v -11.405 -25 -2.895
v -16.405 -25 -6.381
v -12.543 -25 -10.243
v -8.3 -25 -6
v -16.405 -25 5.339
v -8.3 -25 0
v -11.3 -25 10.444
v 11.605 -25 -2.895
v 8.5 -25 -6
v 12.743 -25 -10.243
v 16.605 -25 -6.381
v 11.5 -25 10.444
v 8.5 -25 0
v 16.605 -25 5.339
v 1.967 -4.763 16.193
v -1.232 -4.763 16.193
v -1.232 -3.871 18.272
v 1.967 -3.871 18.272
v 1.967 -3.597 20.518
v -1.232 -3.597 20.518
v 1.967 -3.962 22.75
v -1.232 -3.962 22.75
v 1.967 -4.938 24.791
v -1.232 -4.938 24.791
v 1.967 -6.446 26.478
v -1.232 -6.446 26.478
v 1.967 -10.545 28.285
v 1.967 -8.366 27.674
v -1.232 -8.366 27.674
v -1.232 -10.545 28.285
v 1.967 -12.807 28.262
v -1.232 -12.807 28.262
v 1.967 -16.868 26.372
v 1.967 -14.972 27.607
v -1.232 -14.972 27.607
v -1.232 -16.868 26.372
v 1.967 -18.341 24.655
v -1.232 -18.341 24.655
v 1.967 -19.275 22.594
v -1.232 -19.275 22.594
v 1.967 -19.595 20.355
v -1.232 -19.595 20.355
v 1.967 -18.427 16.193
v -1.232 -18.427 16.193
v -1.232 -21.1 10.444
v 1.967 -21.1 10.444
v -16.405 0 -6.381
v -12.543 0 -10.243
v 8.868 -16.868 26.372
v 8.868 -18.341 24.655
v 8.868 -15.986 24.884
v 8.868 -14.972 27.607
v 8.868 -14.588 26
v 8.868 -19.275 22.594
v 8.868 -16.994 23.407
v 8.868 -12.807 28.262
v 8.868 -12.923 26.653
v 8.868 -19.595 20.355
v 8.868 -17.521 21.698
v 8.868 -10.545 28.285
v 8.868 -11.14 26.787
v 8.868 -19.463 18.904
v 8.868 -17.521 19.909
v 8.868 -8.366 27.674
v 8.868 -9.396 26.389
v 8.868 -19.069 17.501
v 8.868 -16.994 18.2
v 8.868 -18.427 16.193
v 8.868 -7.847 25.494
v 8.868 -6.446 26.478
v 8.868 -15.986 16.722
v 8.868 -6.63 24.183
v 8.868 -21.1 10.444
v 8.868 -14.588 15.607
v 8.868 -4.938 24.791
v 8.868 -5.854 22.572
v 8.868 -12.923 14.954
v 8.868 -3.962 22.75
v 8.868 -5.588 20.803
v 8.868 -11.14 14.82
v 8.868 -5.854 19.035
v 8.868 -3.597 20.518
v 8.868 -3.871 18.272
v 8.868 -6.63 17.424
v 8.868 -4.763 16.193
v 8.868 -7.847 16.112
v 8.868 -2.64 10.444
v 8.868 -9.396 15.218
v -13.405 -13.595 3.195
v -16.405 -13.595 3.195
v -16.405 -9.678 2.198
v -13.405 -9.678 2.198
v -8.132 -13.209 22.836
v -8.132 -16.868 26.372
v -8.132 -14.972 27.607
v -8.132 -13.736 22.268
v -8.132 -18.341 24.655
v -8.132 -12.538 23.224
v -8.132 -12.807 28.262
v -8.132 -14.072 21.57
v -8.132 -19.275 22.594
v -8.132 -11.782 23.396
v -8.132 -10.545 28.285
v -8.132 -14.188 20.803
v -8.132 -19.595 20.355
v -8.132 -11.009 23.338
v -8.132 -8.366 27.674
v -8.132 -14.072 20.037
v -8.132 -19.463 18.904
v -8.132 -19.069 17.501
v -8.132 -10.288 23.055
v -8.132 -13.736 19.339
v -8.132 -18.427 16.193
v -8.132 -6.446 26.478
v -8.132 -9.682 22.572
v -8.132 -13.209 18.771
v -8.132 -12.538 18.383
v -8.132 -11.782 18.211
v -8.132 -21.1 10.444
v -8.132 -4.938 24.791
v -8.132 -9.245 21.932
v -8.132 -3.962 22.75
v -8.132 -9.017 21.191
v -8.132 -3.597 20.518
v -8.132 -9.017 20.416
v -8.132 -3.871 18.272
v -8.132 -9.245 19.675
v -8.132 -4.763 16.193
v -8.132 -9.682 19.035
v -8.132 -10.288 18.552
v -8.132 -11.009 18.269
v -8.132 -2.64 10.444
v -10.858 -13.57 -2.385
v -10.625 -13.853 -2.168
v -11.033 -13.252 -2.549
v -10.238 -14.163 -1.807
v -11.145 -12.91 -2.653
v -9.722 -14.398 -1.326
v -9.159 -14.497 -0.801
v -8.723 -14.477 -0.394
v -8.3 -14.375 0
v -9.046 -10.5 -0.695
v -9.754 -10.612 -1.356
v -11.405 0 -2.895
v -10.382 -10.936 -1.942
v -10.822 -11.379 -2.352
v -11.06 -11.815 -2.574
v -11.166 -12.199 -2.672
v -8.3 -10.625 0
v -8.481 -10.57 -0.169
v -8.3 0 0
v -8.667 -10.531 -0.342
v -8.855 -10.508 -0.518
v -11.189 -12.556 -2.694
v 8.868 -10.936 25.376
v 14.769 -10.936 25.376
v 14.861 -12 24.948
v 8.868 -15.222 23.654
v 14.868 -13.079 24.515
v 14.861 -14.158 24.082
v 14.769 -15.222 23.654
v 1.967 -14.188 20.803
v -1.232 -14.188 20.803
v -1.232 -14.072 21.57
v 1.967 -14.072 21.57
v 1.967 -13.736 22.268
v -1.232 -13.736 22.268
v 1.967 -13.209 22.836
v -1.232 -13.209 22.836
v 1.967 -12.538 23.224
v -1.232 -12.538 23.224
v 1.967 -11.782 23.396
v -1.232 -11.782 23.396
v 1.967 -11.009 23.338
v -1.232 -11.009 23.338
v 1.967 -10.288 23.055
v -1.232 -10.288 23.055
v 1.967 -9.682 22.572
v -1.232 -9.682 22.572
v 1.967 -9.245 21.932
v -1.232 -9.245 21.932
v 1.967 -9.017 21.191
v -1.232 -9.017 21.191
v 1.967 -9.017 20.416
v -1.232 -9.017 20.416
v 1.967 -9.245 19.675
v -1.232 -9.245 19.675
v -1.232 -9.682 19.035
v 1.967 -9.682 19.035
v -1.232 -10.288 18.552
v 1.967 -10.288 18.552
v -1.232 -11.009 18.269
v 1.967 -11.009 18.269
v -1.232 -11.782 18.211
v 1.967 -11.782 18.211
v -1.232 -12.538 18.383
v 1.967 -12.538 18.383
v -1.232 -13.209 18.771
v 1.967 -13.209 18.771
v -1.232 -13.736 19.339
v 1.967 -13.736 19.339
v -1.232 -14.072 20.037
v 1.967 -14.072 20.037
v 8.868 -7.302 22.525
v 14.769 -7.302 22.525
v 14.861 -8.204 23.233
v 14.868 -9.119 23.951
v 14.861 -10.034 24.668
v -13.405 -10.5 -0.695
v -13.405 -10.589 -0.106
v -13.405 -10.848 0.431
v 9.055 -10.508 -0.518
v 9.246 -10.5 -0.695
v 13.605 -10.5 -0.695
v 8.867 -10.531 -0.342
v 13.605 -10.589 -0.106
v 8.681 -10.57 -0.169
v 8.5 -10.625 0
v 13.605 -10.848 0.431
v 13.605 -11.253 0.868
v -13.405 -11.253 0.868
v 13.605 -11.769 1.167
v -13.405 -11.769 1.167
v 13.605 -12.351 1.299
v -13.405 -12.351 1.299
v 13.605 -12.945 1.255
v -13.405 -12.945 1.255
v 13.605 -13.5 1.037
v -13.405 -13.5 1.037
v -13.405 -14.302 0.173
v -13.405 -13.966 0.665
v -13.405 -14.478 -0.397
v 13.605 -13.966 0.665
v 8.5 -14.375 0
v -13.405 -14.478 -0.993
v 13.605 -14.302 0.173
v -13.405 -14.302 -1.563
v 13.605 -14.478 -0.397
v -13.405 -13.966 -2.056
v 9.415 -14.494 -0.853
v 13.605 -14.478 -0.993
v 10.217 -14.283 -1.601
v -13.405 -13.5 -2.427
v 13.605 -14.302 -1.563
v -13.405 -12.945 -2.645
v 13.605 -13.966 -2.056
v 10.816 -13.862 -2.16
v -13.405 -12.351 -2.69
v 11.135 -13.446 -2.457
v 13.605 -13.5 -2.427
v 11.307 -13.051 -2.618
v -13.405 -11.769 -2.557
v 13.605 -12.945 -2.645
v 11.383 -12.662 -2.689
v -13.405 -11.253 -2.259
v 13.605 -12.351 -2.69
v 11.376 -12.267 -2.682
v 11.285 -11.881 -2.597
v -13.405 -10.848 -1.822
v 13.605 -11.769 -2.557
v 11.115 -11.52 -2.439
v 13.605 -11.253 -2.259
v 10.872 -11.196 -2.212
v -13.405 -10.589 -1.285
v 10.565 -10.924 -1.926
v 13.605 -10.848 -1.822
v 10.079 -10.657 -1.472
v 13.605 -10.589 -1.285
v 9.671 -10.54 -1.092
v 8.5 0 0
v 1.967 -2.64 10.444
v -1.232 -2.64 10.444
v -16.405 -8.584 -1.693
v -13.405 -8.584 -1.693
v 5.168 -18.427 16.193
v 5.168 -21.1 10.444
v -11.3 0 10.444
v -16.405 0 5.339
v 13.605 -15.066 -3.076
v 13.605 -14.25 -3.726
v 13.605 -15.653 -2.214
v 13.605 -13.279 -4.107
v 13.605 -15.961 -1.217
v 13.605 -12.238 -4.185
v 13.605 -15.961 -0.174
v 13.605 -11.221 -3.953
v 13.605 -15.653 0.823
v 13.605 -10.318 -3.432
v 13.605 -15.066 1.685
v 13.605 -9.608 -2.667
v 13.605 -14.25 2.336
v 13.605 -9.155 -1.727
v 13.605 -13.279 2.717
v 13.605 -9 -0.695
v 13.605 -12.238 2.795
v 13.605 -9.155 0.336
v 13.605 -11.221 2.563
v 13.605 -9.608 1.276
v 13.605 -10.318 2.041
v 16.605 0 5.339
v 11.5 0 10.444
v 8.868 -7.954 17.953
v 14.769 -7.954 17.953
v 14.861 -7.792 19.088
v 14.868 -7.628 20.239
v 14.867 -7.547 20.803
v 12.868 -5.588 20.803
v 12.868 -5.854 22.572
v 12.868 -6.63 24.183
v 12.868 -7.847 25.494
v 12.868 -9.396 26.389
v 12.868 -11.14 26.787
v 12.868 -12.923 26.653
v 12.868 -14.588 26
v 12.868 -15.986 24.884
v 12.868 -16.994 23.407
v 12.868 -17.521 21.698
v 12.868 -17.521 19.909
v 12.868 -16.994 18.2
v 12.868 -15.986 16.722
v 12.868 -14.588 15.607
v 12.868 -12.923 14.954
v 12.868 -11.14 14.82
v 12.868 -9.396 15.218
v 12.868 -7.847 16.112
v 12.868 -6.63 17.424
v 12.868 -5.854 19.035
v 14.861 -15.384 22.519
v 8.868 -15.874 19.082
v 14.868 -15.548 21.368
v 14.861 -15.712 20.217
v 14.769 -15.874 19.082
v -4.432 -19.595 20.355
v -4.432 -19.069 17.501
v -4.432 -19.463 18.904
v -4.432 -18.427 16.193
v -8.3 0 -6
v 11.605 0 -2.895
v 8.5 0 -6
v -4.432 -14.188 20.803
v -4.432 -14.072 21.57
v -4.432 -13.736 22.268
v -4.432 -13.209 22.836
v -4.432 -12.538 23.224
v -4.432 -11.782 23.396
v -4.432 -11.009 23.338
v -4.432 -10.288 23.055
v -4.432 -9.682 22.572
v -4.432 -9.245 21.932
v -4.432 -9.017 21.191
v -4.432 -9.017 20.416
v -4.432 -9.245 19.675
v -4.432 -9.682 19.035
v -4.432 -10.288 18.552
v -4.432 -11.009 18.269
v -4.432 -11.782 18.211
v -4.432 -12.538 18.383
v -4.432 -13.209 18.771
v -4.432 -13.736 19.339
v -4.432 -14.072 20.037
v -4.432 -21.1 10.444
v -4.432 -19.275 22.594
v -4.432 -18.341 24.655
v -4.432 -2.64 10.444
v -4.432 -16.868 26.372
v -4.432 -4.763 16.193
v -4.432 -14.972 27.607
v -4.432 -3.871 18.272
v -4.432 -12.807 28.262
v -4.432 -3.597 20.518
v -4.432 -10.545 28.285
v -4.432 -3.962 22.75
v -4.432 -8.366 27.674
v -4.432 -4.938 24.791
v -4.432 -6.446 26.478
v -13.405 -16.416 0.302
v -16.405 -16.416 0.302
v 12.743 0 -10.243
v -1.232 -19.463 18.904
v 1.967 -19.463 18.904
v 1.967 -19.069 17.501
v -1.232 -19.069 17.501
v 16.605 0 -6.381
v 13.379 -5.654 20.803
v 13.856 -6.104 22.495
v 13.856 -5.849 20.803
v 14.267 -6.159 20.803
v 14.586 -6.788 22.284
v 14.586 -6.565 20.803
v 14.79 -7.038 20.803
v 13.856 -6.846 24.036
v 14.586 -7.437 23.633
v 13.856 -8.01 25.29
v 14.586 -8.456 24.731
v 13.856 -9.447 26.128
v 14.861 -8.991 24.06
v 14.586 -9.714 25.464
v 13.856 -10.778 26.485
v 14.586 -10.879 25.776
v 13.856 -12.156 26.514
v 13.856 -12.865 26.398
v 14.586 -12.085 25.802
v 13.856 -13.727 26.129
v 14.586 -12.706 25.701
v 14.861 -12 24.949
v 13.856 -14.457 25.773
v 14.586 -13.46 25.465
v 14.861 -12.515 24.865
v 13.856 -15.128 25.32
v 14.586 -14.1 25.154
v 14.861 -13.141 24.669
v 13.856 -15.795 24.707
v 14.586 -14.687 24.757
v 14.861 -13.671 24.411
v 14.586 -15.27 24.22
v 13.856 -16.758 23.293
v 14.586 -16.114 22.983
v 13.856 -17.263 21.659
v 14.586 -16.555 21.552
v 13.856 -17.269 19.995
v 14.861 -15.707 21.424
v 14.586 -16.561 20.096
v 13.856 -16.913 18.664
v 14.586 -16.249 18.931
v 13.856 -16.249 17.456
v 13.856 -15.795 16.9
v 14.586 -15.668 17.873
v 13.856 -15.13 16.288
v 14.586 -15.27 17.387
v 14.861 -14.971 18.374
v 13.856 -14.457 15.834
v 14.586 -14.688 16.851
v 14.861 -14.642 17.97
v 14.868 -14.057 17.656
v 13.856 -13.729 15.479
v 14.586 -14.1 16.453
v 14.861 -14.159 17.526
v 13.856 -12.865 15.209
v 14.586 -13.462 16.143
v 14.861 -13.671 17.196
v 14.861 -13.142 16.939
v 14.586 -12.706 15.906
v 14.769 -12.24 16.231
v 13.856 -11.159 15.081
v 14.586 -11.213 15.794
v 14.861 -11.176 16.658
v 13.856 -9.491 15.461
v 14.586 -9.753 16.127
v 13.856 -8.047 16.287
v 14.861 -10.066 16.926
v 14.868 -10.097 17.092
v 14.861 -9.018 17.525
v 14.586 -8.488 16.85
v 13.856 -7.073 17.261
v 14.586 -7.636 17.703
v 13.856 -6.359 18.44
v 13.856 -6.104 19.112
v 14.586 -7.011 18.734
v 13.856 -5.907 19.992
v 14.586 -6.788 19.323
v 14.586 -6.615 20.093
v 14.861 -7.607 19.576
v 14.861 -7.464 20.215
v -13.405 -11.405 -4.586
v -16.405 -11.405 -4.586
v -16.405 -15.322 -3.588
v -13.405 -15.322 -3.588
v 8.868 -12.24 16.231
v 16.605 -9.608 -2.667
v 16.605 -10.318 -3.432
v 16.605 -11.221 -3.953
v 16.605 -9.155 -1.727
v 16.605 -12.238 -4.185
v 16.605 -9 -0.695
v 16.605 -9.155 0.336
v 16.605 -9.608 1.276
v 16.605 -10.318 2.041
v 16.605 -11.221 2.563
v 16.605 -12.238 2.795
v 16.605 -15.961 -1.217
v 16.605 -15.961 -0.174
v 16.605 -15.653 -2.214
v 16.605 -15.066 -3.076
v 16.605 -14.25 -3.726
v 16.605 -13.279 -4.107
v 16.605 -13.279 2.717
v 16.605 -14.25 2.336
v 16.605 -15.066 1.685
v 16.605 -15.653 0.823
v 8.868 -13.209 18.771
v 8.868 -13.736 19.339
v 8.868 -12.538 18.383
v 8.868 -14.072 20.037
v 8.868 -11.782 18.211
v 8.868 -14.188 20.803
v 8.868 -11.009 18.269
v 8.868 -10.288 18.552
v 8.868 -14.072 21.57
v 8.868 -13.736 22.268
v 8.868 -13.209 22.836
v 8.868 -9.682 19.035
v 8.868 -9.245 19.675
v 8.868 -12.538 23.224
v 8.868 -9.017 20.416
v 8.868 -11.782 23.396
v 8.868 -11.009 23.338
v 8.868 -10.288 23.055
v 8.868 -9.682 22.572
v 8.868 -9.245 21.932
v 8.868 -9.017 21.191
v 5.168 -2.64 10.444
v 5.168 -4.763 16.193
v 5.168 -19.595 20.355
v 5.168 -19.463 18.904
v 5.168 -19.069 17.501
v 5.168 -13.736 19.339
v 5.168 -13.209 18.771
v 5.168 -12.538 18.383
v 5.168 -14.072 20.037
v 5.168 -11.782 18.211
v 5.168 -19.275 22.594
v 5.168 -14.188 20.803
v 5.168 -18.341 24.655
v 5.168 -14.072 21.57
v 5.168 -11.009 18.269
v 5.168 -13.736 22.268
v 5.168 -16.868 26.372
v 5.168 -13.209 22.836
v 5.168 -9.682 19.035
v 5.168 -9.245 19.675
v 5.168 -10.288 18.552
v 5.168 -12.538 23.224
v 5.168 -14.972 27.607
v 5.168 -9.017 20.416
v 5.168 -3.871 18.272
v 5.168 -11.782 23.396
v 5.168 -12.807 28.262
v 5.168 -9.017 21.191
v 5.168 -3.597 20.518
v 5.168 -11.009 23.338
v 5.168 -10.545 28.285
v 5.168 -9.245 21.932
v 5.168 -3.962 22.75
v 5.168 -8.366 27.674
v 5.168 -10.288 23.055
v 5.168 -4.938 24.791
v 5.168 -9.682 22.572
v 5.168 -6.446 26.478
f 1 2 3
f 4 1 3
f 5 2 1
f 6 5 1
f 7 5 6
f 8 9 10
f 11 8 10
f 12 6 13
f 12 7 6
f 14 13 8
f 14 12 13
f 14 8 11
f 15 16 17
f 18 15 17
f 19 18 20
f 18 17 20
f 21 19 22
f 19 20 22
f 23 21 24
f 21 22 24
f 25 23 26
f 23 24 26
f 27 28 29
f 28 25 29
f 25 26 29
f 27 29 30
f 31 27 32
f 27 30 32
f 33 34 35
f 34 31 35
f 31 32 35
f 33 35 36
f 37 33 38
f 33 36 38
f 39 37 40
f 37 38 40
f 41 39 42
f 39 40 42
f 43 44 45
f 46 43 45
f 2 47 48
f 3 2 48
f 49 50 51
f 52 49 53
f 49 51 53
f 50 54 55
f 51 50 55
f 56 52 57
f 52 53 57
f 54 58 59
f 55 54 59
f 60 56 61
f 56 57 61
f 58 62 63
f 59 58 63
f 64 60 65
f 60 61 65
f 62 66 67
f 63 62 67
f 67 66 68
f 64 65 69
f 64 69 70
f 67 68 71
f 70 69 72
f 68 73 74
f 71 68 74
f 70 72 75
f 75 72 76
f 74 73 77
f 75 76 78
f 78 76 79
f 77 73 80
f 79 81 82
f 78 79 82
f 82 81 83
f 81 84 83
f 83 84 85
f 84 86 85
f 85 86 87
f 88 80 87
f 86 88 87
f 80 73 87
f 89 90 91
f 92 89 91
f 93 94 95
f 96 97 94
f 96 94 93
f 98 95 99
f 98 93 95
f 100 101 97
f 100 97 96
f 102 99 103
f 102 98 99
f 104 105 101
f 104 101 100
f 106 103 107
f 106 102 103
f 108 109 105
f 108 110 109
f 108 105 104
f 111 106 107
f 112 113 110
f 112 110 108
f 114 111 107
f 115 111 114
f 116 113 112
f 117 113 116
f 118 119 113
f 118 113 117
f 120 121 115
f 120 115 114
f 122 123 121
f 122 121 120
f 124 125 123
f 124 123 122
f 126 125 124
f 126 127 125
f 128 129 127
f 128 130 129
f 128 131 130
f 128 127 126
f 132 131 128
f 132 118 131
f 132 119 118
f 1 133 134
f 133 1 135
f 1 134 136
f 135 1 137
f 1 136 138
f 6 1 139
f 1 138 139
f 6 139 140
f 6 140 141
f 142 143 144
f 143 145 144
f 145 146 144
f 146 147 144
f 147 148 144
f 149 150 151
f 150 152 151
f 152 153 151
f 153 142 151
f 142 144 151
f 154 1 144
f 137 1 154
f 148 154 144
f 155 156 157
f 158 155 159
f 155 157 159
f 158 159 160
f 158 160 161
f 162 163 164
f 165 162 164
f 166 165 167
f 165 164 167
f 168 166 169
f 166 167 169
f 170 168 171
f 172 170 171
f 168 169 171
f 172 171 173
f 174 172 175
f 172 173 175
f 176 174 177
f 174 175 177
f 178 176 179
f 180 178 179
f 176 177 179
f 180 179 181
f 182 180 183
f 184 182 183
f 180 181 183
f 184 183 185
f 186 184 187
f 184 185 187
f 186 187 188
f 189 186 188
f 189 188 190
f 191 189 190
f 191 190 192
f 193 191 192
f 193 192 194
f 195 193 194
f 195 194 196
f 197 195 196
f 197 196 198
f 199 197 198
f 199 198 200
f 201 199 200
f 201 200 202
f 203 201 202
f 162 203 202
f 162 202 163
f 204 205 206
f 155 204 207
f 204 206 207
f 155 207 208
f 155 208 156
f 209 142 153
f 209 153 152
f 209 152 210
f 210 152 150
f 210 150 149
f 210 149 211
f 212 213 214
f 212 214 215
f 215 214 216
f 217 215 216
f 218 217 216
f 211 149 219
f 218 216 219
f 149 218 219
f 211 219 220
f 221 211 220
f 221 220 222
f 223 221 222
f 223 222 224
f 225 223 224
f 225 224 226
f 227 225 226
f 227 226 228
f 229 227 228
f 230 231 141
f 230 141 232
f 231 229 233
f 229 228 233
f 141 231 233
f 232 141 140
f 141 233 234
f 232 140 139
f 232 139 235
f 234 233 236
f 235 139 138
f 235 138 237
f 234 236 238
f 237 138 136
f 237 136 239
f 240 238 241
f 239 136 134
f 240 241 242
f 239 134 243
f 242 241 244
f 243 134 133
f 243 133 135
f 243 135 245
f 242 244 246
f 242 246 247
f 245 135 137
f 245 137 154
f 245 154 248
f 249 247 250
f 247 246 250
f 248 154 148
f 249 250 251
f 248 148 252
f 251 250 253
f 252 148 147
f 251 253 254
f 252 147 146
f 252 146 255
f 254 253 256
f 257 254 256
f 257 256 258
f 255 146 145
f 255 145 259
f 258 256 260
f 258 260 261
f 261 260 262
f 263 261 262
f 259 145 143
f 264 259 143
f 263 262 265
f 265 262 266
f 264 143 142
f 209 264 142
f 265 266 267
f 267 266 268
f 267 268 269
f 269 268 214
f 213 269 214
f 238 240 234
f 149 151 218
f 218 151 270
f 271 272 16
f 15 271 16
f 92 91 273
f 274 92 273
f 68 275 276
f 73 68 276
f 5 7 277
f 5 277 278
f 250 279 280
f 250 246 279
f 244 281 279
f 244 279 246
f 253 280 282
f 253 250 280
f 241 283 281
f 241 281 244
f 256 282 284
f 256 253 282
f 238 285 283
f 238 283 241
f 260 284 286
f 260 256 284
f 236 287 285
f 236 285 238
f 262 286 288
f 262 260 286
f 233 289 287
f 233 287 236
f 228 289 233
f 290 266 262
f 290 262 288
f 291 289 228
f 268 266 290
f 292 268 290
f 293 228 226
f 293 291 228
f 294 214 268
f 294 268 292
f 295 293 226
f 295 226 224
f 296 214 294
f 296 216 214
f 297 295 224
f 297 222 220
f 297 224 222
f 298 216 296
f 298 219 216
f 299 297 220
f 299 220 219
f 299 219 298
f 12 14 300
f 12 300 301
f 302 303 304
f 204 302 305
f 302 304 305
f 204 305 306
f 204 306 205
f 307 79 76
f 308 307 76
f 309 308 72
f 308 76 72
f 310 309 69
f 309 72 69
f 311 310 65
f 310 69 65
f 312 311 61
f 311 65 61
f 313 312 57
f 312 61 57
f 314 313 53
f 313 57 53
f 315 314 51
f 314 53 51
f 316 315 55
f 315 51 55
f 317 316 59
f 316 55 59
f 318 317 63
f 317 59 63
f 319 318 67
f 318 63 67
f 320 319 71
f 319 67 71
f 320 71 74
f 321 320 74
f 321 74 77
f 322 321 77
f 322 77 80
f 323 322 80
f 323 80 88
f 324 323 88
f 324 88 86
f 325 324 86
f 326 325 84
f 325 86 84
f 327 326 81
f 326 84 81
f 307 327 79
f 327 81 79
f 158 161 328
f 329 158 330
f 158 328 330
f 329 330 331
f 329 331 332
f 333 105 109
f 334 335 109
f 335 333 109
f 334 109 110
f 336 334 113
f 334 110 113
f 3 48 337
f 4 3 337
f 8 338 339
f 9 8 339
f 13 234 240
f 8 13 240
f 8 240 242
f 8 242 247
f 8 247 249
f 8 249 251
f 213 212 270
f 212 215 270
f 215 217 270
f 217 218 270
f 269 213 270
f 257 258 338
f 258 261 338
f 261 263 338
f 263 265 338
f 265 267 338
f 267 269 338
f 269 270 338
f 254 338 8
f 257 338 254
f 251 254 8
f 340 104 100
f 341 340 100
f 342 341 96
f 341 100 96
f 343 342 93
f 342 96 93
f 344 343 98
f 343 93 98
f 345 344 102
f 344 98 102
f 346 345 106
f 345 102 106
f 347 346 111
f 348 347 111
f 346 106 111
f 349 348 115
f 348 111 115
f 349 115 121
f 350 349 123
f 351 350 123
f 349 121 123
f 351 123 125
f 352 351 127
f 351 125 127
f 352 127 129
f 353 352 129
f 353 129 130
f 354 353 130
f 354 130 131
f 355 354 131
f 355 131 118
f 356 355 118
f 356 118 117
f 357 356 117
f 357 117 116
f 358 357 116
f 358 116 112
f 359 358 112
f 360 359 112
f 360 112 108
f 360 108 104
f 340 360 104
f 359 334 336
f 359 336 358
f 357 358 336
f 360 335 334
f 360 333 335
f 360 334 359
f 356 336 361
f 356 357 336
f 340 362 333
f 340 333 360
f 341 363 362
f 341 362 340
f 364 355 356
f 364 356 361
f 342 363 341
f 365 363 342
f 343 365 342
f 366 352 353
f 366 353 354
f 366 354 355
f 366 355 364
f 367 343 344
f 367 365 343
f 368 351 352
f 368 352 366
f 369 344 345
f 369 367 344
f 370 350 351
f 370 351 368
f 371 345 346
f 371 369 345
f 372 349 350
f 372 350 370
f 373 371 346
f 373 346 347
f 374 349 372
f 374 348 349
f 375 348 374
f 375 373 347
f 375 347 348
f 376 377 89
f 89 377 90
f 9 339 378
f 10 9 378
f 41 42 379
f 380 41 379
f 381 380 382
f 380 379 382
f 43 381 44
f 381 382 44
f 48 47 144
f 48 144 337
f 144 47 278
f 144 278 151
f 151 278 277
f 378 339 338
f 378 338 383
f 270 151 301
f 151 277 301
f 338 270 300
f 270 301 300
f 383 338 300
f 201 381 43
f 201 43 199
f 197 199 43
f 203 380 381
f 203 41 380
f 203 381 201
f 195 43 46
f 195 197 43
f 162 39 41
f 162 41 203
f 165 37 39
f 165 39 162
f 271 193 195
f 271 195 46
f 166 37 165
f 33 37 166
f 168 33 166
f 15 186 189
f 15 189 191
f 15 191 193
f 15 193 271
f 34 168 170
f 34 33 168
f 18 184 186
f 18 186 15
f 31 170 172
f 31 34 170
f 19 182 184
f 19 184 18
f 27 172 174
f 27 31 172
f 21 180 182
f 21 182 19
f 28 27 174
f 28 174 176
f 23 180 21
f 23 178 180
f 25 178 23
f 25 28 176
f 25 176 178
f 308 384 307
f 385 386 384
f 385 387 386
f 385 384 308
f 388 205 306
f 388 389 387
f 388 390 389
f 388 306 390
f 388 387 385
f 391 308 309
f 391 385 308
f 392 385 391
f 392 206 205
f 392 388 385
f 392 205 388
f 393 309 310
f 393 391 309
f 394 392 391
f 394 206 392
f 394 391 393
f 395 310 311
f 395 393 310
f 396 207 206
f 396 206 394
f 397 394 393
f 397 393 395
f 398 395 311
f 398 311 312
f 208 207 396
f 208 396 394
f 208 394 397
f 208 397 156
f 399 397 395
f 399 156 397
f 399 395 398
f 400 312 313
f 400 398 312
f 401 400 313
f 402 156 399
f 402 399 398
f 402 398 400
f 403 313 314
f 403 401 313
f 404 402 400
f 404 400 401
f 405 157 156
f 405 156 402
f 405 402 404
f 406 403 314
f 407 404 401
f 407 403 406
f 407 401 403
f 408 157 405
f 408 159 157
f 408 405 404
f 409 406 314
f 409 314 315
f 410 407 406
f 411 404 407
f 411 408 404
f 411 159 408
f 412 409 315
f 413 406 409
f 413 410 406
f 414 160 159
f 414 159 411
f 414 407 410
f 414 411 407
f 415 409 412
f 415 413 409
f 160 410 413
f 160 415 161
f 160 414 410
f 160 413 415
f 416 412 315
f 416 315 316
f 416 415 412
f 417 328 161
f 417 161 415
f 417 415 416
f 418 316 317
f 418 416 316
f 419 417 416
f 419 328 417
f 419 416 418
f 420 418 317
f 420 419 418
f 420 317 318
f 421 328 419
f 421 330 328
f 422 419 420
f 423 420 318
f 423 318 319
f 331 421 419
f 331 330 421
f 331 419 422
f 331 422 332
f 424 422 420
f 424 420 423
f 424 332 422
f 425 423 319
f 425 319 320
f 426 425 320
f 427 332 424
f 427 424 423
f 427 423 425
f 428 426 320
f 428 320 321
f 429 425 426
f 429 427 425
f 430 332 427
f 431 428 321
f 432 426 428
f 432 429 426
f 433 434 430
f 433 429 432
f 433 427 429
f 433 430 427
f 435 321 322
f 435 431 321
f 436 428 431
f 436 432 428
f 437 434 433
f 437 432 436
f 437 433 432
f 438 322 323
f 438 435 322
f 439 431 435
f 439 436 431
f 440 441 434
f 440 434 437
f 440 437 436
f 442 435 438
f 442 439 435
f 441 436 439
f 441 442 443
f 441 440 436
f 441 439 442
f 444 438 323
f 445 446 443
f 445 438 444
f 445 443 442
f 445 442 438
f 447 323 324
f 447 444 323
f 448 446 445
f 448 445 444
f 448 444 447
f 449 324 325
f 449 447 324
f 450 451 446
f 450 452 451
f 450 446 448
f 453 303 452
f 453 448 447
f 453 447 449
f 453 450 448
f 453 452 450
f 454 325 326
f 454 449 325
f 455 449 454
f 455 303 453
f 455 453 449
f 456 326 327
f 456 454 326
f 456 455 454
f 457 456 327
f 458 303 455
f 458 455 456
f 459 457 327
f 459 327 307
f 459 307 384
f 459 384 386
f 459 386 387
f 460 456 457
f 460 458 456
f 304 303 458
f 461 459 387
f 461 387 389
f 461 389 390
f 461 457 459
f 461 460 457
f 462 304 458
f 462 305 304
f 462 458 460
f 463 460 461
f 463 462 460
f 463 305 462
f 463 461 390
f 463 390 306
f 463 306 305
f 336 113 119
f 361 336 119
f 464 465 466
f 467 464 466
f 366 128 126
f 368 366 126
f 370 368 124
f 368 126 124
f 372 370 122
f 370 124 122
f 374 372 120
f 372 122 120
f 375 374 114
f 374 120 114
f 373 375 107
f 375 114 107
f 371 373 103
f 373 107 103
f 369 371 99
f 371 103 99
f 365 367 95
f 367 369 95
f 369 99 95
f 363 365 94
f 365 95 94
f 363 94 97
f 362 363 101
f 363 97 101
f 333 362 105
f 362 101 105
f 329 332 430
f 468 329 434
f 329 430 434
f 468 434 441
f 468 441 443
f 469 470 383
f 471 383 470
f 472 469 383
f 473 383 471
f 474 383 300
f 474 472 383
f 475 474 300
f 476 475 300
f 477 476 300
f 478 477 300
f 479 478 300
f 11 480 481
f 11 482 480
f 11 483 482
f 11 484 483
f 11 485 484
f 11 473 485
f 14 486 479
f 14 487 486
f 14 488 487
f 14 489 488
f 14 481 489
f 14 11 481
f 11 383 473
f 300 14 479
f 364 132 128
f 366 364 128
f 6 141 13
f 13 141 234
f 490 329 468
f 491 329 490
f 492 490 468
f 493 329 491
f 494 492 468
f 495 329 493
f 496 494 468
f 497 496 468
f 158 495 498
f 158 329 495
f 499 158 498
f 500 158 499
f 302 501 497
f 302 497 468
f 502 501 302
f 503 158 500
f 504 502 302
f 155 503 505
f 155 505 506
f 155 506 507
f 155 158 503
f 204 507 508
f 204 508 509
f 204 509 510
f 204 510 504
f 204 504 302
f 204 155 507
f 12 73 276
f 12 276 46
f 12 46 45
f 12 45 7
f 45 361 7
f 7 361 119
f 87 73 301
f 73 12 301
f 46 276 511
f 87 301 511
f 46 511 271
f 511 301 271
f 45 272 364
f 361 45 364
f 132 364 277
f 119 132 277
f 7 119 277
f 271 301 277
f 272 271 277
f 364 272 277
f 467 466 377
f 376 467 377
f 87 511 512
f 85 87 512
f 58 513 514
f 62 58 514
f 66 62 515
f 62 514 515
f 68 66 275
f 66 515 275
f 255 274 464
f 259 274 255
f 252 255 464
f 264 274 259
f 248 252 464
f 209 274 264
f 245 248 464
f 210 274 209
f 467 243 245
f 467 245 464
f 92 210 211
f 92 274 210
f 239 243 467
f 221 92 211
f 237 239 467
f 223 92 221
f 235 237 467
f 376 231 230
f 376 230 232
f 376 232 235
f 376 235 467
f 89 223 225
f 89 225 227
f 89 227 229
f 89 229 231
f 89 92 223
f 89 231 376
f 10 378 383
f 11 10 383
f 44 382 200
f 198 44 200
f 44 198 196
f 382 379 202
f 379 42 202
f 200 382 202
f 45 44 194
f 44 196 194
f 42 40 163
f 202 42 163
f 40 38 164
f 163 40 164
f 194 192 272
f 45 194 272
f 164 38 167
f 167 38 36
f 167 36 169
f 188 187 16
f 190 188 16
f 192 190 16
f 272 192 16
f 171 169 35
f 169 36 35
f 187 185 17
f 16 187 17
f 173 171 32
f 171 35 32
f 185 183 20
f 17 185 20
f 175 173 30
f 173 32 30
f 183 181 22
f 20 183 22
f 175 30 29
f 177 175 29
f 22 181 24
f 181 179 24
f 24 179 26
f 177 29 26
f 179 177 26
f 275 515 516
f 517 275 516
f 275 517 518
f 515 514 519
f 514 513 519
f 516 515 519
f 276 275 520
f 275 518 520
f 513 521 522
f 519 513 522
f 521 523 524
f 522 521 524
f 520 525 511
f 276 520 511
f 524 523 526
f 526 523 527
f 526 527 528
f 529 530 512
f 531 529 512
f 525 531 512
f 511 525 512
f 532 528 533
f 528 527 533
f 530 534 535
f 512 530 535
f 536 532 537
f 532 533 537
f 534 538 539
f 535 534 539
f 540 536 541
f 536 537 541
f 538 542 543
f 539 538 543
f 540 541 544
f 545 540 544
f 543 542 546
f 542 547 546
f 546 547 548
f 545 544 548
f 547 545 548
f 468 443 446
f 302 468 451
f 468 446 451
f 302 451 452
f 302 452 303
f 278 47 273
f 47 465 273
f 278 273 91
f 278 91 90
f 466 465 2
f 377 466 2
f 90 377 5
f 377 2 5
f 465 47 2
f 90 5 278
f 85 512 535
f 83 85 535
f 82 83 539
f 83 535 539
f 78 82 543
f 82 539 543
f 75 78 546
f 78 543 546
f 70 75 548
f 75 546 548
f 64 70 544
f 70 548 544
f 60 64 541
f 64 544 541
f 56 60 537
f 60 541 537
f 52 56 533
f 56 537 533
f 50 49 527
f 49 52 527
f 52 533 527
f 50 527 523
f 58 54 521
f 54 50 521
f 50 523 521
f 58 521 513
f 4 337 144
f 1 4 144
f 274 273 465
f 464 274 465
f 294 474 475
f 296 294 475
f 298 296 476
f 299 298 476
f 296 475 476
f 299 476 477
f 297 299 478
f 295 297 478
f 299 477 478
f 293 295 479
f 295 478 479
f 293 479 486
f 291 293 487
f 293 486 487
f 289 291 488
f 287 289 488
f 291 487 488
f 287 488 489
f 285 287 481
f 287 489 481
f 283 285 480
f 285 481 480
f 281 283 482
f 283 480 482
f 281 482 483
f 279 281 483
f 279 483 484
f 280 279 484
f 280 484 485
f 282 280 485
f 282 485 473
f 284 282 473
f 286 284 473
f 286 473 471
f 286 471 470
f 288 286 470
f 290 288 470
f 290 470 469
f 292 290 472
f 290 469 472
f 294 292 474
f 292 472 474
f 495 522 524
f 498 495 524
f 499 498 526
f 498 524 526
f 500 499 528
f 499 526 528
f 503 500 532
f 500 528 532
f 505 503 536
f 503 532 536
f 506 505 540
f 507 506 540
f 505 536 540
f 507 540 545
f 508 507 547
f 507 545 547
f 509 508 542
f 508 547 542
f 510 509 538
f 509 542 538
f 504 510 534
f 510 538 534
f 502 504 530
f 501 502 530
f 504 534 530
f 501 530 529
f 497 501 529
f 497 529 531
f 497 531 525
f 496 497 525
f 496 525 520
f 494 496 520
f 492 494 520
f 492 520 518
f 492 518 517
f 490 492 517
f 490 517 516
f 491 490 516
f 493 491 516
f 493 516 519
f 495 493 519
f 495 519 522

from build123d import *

# Parameters (mm, degrees)
F1_DEPTH  = 25
F2_W      = 7.596032
F2_H      = 21.10009
F2_W_2    = 10.268714
F2_H_2    = 30.102797
F3_DEPTH  = 25
F4_R      = 2
F5_DEPTH  = 35
F6_R      = 3.5
F7_DEPTH  = 3
F9_DEPTH  = 3
F10_W     = 17
F10_H     = 18.460938
F11_DEPTH = 18
F12_W     = 3.2
F12_H     = 18.460938
F13_DEPTH = 18
F15_DEPTH = 25
F16_R     = 2.6
F17_DEPTH = 25
F18_R     = 6
F19_DEPTH = 6
F20_R     = 2
F22_DEPTH = 6


with BuildPart() as f1:
    # F0 (on Front) → F1 (new body)
    with BuildSketch(Plane.XZ):
        Polygon((-11.404762, -2.895238), (-8.3, 0), (8.5, 0), (11.604762, -2.895238), (8.5, -6), (12.742641, -10.242641), (22.464761, -0.520521), (11.5, 10.44424), (-11.3, 10.44424), (-22.264761, -0.520521), (-12.542641, -10.242641), (-8.3, -6), align=None)
    extrude(amount=F1_DEPTH)

    # F2 (on face) → F3 (cut)
    with BuildSketch(Plane.XZ.offset(25)):
        with Locations((-20.202778, -0.557668)):
            Rectangle(F2_W, F2_H)
        with Locations((21.739119, -1.542339)):
            Rectangle(F2_W_2, F2_H_2)
    extrude(amount=-F3_DEPTH, mode=Mode.SUBTRACT)

    # F4 (on face) → F5 (cut)
    with BuildSketch(Plane.YZ.offset(16.604762)):
        with Locations((-12.5, -0.695238)):
            Circle(F4_R)
    extrude(amount=-F5_DEPTH, mode=Mode.SUBTRACT)

    # F6 (on face) → F7 (cut)
    with BuildSketch(Plane.YZ.offset(16.604762)):
        with Locations((-12.5, -0.695238)):
            Circle(F6_R)
    extrude(amount=-F7_DEPTH, mode=Mode.SUBTRACT)

    # F8 (on face) → F9 (cut)
    with BuildSketch(Plane(origin=(-16.404762, 0, 0), x_dir=(0, -1, 0), z_dir=(-1, 0, 0))):
        Polygon((15.321942, -3.588329), (16.416462, 0.30209), (13.59452, 3.195181), (9.678058, 2.197854), (8.583538, -1.692565), (11.40548, -4.585657), align=None)
    extrude(amount=-F9_DEPTH, mode=Mode.SUBTRACT)

    # F10 (on face) → F11 (join)
    with BuildSketch(Plane.XY.offset(10.44424)):
        with Locations((0.3675, -11.870001)):
            Rectangle(F10_W, F10_H)
    extrude(amount=F11_DEPTH)

    # F12 (on face) → F13 (cut)
    with BuildSketch(Plane.XY.offset(28.44424)):
        with Locations((-2.8325, -11.870001)):
            Rectangle(F12_W, F12_H)
        with Locations((3.5675, -11.870001)):
            Rectangle(F12_W, F12_H)
    extrude(amount=-F13_DEPTH, mode=Mode.SUBTRACT)

    # F14 (on face) → F15 (cut)
    with BuildSketch(Plane(origin=(-8.1325, 0, 0), x_dir=(0, -1, 0), z_dir=(-1, 0, 0))):
        with BuildLine():
            ThreePointArc((4.763152, 16.192717), (9.433907, 28.057198), (19.595274, 20.354699))
            ThreePointArc((19.595274, 20.354699), (19.297773, 18.193332), (18.427397, 16.192717))
            Line((18.427397, 16.192717), (21.10047, 10.44424))
            Line((21.10047, 10.44424), (21.10047, 28.44424))
            Line((21.10047, 28.44424), (2.639532, 28.44424))
            Line((2.639532, 28.44424), (2.639532, 10.44424))
            Line((2.639532, 10.44424), (4.763152, 16.192717))
        make_face()
    extrude(amount=-F15_DEPTH, mode=Mode.SUBTRACT)

    # F16 (on face) → F17 (cut)
    with BuildSketch(Plane(origin=(-8.1325, 0, 0), x_dir=(0, -1, 0), z_dir=(-1, 0, 0))):
        with Locations((11.587898, 20.803435)):
            Circle(F16_R)
    extrude(amount=-F17_DEPTH, mode=Mode.SUBTRACT)

    # F18 (on face) → F19 (join)
    with BuildSketch(Plane.YZ.offset(8.8675)):
        with Locations((-11.587898, 20.803435)):
            Circle(F18_R)
    extrude(amount=F19_DEPTH)

    # F20
    f20_edges = [f1.edges().sort_by_distance(p)[0] for p in [
        (14.8675, -17.587898, 20.803435),
    ]]
    fillet(f20_edges, radius=F20_R)

    # F21 (on face) → F22 (cut)
    with BuildSketch(Plane.YZ.offset(14.8675)):
        Polygon((-12.239687, 16.230853), (-7.95382, 17.952679), (-7.302032, 22.525261), (-10.93611, 25.376017), (-15.221976, 23.654191), (-15.873764, 19.081609), align=None)
    extrude(amount=-F22_DEPTH, mode=Mode.SUBTRACT)


solid = f1.part
